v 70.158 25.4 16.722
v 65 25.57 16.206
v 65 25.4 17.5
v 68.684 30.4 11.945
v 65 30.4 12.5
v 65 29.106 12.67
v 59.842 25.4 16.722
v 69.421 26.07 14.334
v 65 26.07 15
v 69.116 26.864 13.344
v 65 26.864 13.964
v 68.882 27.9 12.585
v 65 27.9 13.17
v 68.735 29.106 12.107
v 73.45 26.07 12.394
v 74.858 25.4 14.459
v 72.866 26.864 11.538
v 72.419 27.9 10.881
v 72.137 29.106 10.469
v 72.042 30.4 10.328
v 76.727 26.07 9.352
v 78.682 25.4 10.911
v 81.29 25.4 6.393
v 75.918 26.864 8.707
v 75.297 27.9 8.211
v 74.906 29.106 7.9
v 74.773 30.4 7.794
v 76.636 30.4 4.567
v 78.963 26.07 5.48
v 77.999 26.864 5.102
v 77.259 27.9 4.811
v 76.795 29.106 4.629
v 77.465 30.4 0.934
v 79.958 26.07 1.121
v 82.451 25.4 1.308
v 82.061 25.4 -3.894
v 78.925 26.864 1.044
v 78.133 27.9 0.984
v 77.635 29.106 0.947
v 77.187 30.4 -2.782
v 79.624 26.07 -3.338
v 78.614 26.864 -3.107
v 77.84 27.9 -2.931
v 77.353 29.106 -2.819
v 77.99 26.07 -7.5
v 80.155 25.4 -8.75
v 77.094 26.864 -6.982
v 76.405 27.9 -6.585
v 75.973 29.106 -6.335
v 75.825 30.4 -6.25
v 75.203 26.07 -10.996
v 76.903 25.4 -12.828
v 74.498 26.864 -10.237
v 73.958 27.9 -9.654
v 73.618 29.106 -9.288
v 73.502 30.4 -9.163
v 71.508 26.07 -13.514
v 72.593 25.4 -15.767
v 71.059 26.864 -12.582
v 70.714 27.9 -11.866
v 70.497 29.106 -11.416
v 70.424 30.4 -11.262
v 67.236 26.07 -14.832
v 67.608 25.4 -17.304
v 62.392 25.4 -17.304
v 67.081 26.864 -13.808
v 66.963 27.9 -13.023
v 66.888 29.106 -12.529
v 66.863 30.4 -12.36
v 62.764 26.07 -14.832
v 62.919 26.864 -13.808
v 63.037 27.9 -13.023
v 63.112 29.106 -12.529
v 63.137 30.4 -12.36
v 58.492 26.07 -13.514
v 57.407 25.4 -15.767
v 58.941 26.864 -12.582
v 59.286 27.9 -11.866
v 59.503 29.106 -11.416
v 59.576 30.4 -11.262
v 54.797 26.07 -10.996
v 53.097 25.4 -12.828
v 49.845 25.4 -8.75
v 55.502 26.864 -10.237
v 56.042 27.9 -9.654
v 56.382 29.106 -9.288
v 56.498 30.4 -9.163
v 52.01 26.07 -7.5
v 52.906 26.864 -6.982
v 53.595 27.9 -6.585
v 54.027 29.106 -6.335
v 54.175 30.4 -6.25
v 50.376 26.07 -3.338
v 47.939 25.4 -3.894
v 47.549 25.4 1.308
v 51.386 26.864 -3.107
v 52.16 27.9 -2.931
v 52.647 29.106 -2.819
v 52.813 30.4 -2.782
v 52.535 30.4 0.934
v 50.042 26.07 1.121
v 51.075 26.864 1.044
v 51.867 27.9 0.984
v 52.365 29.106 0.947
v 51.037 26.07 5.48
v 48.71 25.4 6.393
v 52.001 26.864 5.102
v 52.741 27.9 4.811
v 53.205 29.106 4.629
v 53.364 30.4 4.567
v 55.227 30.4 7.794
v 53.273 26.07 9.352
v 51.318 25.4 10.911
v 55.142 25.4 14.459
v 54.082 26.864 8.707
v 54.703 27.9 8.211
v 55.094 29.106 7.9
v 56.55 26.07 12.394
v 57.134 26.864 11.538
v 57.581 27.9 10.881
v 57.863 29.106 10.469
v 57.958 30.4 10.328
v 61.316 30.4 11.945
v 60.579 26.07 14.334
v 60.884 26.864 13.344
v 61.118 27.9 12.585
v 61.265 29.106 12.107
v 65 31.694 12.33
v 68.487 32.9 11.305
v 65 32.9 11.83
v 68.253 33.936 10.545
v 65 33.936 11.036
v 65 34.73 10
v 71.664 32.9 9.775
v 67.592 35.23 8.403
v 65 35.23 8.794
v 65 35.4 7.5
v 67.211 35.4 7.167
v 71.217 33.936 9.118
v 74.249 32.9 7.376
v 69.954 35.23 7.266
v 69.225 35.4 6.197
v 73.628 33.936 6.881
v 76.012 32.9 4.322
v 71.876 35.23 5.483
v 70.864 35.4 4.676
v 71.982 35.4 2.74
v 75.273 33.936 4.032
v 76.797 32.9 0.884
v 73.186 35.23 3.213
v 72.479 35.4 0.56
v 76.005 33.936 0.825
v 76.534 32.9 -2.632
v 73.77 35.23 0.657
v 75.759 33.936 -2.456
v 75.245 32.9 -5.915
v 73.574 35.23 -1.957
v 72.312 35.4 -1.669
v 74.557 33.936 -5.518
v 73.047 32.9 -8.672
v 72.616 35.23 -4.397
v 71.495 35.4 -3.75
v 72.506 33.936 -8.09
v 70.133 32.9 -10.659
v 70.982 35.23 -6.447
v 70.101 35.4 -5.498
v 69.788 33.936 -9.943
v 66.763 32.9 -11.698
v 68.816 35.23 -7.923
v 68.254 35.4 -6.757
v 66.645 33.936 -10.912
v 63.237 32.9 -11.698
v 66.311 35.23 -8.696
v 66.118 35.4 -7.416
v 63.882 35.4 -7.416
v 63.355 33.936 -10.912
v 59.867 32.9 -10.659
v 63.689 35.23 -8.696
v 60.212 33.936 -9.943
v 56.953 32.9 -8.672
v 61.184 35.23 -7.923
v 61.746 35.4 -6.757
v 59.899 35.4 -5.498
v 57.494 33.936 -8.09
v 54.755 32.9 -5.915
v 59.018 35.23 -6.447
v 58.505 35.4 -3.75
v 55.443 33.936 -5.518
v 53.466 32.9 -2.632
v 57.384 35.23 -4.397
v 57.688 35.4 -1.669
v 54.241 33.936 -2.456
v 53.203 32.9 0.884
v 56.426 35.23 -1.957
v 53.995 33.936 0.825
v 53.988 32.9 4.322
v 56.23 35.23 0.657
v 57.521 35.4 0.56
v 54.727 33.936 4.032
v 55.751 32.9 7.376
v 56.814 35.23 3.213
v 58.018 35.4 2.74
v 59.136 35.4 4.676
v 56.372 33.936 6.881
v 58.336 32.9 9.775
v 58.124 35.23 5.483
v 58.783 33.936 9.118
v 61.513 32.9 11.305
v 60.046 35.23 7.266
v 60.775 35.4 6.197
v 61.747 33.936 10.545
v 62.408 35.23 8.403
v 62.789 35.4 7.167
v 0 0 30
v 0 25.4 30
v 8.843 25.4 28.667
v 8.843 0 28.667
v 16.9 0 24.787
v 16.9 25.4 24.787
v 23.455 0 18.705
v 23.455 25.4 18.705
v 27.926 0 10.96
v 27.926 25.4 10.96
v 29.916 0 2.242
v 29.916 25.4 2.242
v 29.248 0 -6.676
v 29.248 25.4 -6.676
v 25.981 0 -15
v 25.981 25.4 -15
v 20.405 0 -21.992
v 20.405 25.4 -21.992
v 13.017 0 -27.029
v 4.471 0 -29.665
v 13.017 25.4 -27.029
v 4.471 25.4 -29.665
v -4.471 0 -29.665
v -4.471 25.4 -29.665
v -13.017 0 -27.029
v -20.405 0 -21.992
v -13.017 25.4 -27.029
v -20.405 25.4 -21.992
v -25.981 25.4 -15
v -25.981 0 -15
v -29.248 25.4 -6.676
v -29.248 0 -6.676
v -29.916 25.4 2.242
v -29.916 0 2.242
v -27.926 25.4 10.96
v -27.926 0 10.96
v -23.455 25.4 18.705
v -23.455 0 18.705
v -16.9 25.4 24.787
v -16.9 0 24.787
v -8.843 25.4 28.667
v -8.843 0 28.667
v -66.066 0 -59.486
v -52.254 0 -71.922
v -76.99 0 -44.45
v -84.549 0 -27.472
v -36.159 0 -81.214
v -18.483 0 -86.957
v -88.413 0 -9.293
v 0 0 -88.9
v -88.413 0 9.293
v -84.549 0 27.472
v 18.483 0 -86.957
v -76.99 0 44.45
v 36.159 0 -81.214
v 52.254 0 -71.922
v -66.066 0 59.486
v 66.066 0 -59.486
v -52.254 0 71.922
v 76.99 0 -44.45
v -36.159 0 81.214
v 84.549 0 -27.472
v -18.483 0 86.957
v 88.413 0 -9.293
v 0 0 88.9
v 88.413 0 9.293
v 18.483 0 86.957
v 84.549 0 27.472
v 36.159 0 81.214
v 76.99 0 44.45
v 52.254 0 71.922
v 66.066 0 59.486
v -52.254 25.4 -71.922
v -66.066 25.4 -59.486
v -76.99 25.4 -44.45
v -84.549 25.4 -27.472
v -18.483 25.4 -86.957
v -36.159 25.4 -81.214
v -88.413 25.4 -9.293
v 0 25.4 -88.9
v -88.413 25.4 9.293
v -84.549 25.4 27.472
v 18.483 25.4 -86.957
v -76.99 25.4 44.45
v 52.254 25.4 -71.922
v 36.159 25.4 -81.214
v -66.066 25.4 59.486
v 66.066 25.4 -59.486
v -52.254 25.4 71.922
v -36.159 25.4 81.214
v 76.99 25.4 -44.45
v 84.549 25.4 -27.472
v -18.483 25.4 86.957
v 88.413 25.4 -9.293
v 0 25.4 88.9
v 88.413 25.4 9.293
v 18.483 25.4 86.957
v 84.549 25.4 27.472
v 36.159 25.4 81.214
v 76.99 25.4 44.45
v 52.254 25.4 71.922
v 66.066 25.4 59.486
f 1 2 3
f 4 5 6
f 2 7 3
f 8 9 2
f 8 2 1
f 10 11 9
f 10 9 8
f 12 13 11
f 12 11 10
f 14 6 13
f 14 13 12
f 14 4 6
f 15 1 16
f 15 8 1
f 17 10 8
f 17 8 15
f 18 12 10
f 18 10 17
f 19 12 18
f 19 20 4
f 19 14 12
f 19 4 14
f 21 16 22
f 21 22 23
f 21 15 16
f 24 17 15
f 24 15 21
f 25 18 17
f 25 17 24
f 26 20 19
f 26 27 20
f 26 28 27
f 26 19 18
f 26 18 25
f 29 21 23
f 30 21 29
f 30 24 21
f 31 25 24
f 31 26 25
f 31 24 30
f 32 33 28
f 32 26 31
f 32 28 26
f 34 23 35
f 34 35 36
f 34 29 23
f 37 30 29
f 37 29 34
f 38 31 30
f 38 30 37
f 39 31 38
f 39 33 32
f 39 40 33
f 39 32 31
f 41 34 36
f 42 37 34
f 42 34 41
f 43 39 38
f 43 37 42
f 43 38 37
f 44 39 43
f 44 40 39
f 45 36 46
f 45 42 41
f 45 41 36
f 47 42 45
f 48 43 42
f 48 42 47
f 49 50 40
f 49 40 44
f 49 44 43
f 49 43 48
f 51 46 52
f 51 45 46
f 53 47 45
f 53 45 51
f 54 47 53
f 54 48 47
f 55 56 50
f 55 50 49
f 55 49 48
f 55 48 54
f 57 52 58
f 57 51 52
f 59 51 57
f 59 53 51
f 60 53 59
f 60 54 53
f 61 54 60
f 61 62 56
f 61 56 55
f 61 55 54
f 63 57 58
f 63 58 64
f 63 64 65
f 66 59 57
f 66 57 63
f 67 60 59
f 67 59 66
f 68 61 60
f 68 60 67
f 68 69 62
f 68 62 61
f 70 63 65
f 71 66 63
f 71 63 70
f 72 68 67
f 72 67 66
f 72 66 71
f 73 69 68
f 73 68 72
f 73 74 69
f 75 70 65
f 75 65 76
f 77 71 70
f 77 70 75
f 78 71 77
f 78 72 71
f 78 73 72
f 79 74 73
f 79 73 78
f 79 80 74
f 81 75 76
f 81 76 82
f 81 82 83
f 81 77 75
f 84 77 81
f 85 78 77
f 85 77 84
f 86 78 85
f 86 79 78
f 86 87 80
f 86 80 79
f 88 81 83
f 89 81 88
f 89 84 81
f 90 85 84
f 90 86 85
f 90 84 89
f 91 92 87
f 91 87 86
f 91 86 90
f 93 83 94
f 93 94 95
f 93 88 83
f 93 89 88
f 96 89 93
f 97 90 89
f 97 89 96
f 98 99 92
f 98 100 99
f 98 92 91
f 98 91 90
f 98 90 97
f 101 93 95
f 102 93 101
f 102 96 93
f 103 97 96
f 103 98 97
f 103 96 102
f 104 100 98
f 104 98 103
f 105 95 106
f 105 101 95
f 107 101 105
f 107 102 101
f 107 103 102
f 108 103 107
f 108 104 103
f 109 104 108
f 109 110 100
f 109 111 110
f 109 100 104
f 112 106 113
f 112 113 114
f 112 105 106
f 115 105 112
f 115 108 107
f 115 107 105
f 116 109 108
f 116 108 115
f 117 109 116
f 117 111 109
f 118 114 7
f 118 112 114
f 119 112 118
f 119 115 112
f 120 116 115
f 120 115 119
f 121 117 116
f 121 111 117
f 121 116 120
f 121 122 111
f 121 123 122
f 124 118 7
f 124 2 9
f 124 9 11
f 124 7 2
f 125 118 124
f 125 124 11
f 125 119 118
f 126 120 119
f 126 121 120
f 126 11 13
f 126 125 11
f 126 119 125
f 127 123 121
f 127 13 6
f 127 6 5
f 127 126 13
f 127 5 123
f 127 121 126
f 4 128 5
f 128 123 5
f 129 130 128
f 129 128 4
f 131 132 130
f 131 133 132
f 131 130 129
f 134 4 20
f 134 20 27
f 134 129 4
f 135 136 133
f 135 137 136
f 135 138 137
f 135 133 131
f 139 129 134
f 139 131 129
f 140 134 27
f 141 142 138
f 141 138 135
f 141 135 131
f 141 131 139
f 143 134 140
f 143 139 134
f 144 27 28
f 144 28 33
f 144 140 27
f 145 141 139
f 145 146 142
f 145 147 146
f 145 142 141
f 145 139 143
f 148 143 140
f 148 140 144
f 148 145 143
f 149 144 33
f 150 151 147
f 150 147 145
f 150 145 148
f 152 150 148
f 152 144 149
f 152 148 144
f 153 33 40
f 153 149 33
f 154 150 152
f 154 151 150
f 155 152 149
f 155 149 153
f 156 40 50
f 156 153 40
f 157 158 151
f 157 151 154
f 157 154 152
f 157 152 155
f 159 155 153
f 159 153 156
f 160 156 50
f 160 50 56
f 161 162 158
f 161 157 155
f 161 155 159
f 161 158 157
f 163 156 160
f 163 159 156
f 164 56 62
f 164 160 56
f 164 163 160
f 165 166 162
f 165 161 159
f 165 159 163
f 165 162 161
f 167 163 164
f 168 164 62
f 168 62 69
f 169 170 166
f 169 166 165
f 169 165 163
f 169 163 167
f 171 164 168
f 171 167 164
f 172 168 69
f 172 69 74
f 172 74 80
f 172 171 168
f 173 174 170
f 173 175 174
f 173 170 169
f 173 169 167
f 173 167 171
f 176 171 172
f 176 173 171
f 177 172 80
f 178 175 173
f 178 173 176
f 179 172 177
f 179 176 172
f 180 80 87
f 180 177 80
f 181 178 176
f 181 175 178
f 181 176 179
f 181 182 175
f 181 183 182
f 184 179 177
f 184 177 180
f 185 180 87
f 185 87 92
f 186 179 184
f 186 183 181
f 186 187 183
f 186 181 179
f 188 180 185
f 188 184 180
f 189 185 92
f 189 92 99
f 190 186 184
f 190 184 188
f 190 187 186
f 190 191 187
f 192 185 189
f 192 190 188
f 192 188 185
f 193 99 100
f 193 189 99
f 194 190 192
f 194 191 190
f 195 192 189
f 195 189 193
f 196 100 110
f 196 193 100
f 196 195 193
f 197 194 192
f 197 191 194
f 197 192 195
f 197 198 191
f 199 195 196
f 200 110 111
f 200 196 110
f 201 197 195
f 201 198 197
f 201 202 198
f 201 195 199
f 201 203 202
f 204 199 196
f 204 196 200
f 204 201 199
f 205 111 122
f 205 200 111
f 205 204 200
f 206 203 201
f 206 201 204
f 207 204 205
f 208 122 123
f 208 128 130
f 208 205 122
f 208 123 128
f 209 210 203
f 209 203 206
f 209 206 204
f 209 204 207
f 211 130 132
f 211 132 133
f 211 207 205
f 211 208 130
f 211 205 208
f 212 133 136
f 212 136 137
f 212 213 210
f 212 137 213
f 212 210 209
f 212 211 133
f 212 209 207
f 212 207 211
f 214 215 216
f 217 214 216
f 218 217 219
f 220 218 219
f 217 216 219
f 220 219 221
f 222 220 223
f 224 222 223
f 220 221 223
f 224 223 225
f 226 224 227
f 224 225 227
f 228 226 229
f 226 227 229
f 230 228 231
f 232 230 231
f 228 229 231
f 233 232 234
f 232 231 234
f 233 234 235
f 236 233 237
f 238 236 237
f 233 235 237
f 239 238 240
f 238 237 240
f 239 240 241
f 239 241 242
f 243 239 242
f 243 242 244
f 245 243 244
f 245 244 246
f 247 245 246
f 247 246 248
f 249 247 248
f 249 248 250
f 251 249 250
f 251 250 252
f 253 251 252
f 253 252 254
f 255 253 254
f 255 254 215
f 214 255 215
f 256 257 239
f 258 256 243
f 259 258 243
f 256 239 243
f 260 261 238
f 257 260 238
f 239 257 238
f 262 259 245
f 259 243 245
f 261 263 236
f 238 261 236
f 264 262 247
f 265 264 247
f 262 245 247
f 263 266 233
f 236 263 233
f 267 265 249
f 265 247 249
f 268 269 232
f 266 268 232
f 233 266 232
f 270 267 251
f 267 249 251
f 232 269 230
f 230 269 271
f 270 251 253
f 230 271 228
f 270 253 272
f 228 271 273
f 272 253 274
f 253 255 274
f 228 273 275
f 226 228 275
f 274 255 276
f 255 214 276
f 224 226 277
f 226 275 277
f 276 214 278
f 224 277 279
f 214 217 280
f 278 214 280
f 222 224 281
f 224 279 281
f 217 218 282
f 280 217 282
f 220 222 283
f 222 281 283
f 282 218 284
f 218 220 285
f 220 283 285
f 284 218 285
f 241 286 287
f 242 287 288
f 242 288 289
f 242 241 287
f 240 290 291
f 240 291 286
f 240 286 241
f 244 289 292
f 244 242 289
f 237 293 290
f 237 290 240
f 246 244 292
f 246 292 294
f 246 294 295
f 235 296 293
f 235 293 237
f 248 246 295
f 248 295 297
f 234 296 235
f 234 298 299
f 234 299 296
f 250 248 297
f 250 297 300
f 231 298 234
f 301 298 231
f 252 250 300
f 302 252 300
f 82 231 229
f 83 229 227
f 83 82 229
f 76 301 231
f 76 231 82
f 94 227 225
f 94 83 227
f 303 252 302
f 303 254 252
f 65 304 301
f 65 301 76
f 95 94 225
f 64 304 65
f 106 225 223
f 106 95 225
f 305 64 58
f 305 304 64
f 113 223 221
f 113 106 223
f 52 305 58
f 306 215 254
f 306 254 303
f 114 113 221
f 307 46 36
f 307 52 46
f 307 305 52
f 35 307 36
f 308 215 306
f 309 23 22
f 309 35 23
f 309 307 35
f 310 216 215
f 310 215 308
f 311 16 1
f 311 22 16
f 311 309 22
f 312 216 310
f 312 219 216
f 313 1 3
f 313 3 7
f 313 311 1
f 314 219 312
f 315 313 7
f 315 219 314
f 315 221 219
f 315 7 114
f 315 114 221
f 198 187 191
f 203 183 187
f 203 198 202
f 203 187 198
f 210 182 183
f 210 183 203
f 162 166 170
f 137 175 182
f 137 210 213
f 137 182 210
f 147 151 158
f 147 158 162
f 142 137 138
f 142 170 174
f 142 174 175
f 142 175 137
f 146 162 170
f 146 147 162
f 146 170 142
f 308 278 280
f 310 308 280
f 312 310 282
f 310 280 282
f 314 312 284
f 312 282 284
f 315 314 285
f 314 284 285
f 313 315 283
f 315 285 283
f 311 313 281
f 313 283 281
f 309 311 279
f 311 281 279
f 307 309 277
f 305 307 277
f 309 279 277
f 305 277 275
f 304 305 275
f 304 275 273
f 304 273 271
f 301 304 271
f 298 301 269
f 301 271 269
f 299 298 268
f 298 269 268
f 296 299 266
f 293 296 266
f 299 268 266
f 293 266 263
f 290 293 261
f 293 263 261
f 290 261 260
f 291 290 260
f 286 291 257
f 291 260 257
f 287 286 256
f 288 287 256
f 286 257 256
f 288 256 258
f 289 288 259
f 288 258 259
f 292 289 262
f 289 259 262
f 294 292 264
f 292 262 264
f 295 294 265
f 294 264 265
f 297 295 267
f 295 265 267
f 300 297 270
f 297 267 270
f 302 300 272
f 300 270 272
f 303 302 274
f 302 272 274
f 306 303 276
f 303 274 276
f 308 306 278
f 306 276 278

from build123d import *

# Parameters (mm, degrees)
SKETCH1_R           = 88.9
BOSS_EXTRUDE1_DEPTH = 25.4
SKETCH2_R           = 12.5
BOSS_EXTRUDE2_DEPTH = 10
FILLET1_R           = 5
SKETCH3_R           = 30
CUT_EXTRUDE1_DEPTH  = 129.263712717


with BuildPart() as part:
    # Sketch1 → Boss-Extrude1 (new body)
    with BuildSketch(Plane(origin=(0, 0, 0), x_dir=(1, 0, 0), z_dir=(0, 1, 0))):
        with Locations(Location((0, 0, 0), (0, 0, 270))):
            Circle(SKETCH1_R)
    extrude(amount=BOSS_EXTRUDE1_DEPTH)

    # Sketch2 → Boss-Extrude2 (add)
    with BuildSketch(Plane(origin=(0, 25.4, 0), x_dir=(1, 0, 0), z_dir=(0, 1, 0))):
        with Locations(Location((65, 0, 0), (0, 0, 270))):
            Circle(SKETCH2_R)
    extrude(amount=BOSS_EXTRUDE2_DEPTH)

    # Fillet1
    fillet1_edges = [part.edges().sort_by_distance(p)[0] for p in [
        (65, 25.4, -12.5),
        (65, 35.4, -12.5),
    ]]
    fillet(fillet1_edges, radius=FILLET1_R - 0.0001)  # a hair under: the kernel refuses the full size

    # Sketch3 → Cut-Extrude1 (cut, through all)
    with BuildSketch(Plane(origin=(0, 25.4, 0), x_dir=(1, 0, 0), z_dir=(0, 1, 0))):
        with Locations(Location((0, 0, 0), (0, 0, 270))):
            Circle(SKETCH3_R)
    extrude(amount=-CUT_EXTRUDE1_DEPTH, mode=Mode.SUBTRACT)


solid = part.part
